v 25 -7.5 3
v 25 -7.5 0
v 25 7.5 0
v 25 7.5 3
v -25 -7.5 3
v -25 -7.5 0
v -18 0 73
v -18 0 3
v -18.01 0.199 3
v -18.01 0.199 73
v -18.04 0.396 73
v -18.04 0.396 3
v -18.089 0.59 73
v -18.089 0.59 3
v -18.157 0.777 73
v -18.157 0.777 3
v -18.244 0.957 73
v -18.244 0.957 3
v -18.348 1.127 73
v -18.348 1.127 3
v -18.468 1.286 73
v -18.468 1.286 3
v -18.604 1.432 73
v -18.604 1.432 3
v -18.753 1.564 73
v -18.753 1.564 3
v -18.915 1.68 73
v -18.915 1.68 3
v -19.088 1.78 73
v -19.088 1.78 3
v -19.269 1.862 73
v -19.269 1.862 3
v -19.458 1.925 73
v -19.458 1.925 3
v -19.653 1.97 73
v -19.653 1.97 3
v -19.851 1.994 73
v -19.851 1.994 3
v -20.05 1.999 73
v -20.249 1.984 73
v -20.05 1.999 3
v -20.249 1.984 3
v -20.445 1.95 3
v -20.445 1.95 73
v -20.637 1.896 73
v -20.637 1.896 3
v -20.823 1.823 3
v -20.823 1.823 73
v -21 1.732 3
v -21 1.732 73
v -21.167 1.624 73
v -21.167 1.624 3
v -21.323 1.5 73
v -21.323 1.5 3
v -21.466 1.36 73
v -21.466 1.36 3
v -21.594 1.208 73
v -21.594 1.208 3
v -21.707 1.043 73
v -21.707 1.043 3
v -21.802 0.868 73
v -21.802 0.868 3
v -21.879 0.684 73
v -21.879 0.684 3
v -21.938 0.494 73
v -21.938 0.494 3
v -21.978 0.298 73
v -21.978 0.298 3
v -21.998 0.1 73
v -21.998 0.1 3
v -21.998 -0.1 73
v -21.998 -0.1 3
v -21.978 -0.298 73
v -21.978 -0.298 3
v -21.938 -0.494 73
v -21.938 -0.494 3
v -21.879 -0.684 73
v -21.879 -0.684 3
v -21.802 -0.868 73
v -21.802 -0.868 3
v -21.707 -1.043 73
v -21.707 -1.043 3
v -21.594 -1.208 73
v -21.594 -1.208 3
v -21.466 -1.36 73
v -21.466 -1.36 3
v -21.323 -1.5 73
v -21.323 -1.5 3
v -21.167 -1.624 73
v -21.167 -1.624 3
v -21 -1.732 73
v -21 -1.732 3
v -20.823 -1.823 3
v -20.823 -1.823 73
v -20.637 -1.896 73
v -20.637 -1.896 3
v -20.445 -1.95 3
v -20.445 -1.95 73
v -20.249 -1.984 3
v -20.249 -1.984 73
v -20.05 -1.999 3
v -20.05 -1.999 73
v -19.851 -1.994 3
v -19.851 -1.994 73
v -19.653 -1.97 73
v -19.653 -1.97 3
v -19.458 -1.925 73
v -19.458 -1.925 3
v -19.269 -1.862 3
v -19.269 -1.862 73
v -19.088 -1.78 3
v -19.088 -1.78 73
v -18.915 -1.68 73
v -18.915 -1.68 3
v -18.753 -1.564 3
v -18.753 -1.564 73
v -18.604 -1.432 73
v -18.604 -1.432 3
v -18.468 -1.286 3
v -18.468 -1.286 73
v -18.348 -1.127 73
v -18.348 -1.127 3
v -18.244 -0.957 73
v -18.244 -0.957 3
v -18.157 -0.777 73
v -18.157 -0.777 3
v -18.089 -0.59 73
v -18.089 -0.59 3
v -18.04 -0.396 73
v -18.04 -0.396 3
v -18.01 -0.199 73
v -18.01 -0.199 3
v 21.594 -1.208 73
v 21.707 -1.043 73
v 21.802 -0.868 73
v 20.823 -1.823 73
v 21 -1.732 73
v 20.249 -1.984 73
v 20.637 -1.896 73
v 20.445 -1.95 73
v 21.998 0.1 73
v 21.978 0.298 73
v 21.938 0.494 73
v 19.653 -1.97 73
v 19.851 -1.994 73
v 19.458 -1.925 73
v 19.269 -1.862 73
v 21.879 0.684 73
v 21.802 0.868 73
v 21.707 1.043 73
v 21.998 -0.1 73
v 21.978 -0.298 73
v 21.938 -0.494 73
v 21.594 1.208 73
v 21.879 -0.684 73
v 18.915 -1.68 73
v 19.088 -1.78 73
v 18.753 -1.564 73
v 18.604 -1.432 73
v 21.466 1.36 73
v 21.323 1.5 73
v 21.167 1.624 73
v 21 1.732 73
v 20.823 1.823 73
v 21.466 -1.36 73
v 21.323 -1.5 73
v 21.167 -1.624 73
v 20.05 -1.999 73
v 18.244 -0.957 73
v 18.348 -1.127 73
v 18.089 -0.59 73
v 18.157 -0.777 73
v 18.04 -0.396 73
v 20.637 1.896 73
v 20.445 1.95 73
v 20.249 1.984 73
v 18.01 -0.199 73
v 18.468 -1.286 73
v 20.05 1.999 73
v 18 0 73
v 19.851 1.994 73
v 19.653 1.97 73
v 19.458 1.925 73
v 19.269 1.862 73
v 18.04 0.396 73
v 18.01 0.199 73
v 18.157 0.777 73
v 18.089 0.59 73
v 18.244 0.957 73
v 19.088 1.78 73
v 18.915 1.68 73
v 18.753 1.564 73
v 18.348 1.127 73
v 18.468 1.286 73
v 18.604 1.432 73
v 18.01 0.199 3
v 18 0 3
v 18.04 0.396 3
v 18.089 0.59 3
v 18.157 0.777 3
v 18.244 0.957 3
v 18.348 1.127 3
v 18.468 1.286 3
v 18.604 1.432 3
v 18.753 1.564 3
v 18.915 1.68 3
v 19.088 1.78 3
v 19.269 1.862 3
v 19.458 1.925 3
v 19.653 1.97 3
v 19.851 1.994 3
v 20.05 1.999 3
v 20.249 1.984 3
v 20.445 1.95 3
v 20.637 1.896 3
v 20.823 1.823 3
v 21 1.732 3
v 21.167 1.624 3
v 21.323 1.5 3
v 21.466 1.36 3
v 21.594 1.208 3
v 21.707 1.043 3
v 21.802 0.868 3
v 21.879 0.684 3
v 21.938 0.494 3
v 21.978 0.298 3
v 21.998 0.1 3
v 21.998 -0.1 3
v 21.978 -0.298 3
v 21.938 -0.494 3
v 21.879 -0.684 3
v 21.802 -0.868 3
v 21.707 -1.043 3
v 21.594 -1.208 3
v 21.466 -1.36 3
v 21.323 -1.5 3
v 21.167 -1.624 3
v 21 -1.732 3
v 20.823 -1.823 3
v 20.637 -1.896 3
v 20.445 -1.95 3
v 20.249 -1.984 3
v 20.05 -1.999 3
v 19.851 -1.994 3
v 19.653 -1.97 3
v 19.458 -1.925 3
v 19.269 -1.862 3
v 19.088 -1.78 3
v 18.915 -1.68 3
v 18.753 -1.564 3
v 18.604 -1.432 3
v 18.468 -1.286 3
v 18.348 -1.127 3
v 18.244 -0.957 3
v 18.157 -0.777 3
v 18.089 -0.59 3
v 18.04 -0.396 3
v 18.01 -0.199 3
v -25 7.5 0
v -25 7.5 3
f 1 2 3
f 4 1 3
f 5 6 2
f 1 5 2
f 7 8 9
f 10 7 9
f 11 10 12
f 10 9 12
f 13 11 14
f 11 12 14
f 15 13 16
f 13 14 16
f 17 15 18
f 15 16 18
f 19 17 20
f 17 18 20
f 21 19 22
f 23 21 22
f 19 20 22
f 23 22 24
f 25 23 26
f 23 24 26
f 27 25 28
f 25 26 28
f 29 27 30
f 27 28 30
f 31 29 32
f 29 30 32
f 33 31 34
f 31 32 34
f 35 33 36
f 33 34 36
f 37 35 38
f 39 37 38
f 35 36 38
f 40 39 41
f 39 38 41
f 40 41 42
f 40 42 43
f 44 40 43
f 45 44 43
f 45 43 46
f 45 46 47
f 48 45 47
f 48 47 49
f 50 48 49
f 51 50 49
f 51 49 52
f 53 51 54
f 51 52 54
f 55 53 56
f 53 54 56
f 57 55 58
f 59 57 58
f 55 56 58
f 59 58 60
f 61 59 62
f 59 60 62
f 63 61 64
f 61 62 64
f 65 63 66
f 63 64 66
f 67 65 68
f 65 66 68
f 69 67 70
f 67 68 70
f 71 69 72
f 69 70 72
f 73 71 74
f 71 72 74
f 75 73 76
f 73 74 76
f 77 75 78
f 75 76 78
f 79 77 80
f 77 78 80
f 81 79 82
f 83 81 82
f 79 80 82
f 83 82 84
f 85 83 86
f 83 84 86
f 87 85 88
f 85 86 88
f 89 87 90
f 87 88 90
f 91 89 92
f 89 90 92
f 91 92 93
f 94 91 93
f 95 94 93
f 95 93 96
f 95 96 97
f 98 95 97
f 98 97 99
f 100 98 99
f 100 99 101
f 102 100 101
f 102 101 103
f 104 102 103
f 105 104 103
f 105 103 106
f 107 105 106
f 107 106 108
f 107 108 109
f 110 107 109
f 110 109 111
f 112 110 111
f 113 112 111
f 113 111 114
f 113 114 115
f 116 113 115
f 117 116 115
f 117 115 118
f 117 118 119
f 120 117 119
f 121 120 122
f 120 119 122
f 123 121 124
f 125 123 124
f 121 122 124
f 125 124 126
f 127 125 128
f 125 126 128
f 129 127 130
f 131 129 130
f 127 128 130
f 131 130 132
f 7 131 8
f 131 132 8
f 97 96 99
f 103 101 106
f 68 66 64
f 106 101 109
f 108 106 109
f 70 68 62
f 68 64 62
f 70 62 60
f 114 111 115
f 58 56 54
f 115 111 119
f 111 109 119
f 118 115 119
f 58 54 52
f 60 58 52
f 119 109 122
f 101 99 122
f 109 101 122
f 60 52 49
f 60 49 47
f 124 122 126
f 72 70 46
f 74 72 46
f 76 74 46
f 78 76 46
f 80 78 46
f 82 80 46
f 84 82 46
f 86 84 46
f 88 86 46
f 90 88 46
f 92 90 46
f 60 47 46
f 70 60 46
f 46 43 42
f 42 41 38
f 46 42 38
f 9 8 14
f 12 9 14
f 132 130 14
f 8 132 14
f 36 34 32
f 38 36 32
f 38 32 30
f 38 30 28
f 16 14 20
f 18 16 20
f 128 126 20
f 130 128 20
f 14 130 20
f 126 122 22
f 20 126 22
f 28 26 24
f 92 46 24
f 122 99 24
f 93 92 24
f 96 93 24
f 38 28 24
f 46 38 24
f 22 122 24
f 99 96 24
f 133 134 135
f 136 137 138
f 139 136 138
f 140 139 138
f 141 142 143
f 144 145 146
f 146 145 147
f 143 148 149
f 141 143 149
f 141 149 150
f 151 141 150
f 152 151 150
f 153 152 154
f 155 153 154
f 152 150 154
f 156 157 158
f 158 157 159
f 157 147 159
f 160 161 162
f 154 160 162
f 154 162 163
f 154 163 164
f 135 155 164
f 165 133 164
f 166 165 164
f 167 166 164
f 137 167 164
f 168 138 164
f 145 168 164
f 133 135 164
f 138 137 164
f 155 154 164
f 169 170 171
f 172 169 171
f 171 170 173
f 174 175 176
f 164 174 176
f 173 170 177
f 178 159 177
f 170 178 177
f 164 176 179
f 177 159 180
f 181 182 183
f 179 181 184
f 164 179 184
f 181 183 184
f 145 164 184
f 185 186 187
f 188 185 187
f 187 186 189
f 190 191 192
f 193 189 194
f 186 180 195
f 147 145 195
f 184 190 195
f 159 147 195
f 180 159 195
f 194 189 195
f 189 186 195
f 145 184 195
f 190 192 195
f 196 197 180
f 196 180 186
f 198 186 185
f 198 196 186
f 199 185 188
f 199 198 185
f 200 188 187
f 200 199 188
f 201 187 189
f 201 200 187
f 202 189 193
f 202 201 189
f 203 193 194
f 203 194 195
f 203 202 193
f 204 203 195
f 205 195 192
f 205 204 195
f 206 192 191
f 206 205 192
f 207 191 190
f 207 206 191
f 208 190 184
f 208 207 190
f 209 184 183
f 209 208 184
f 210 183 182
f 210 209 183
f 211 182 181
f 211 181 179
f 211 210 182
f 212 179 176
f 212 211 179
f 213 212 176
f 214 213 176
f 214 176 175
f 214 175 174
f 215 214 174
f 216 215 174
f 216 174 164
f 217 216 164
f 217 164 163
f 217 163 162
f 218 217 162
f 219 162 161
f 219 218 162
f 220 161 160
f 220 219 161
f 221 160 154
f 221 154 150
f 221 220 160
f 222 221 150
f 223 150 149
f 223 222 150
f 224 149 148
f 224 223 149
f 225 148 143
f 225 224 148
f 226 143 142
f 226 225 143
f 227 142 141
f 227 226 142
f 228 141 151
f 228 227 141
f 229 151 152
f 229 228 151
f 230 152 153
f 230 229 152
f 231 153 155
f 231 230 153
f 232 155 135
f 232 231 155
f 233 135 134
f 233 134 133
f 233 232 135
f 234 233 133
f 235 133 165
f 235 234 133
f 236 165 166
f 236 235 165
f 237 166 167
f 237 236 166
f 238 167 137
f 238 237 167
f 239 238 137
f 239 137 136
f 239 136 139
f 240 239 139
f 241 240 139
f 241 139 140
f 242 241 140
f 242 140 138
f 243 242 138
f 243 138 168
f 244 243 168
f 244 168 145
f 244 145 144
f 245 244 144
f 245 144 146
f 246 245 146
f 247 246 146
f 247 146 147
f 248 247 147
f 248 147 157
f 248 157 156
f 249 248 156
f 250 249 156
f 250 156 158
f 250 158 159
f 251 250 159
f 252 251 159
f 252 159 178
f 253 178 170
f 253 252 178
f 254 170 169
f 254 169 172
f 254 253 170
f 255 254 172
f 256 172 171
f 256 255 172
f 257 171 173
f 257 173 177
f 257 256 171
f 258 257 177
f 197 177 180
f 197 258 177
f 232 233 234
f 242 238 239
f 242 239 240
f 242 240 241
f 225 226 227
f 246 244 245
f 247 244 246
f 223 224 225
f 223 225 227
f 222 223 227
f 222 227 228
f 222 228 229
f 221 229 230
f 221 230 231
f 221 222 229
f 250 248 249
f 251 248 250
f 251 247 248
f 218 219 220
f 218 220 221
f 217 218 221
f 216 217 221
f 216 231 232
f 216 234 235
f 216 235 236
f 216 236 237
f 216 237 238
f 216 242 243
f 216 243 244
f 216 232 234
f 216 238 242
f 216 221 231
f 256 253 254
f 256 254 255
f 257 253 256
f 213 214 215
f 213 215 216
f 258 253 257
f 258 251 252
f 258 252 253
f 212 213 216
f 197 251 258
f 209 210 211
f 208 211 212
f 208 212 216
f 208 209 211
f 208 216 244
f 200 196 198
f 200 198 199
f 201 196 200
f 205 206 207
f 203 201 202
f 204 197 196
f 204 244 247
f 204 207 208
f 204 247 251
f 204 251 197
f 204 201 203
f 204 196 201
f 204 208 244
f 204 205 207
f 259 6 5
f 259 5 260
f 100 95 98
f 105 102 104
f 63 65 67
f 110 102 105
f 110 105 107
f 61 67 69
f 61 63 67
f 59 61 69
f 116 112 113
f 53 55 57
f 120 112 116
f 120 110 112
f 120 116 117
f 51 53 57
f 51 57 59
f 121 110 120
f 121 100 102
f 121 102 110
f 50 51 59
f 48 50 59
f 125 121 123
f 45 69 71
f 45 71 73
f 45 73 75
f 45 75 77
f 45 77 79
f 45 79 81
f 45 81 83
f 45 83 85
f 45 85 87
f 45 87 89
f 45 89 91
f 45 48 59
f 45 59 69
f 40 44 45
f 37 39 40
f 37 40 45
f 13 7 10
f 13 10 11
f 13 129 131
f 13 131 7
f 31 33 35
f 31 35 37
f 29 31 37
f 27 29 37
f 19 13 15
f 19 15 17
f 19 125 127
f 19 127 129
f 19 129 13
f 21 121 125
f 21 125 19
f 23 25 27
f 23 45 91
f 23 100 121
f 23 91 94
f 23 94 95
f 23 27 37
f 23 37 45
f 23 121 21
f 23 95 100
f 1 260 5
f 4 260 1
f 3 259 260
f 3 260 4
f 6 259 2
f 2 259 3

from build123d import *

# Parameters (mm, degrees)
F0_W     = 50
F0_H     = 15
F1_DEPTH = 3
F2_R     = 2
F3_DEPTH = 70


with BuildPart() as f1:
    # F0 (on Top) → F1 (new body)
    with BuildSketch(Plane.XY):
        Rectangle(F0_W, F0_H)
    extrude(amount=F1_DEPTH)


with BuildPart() as f3:
    # F2 (on face) → F3 (new body)
    with BuildSketch(Plane.XY.offset(3)):
        with Locations((-20, 0)):
            Circle(F2_R)
    extrude(amount=F3_DEPTH)


with BuildPart() as f4_1:
    # F4: instance of F3
    add(f3.part.mirror(Plane.YZ))


solid = Compound([f1.part, f3.part, f4_1.part])
